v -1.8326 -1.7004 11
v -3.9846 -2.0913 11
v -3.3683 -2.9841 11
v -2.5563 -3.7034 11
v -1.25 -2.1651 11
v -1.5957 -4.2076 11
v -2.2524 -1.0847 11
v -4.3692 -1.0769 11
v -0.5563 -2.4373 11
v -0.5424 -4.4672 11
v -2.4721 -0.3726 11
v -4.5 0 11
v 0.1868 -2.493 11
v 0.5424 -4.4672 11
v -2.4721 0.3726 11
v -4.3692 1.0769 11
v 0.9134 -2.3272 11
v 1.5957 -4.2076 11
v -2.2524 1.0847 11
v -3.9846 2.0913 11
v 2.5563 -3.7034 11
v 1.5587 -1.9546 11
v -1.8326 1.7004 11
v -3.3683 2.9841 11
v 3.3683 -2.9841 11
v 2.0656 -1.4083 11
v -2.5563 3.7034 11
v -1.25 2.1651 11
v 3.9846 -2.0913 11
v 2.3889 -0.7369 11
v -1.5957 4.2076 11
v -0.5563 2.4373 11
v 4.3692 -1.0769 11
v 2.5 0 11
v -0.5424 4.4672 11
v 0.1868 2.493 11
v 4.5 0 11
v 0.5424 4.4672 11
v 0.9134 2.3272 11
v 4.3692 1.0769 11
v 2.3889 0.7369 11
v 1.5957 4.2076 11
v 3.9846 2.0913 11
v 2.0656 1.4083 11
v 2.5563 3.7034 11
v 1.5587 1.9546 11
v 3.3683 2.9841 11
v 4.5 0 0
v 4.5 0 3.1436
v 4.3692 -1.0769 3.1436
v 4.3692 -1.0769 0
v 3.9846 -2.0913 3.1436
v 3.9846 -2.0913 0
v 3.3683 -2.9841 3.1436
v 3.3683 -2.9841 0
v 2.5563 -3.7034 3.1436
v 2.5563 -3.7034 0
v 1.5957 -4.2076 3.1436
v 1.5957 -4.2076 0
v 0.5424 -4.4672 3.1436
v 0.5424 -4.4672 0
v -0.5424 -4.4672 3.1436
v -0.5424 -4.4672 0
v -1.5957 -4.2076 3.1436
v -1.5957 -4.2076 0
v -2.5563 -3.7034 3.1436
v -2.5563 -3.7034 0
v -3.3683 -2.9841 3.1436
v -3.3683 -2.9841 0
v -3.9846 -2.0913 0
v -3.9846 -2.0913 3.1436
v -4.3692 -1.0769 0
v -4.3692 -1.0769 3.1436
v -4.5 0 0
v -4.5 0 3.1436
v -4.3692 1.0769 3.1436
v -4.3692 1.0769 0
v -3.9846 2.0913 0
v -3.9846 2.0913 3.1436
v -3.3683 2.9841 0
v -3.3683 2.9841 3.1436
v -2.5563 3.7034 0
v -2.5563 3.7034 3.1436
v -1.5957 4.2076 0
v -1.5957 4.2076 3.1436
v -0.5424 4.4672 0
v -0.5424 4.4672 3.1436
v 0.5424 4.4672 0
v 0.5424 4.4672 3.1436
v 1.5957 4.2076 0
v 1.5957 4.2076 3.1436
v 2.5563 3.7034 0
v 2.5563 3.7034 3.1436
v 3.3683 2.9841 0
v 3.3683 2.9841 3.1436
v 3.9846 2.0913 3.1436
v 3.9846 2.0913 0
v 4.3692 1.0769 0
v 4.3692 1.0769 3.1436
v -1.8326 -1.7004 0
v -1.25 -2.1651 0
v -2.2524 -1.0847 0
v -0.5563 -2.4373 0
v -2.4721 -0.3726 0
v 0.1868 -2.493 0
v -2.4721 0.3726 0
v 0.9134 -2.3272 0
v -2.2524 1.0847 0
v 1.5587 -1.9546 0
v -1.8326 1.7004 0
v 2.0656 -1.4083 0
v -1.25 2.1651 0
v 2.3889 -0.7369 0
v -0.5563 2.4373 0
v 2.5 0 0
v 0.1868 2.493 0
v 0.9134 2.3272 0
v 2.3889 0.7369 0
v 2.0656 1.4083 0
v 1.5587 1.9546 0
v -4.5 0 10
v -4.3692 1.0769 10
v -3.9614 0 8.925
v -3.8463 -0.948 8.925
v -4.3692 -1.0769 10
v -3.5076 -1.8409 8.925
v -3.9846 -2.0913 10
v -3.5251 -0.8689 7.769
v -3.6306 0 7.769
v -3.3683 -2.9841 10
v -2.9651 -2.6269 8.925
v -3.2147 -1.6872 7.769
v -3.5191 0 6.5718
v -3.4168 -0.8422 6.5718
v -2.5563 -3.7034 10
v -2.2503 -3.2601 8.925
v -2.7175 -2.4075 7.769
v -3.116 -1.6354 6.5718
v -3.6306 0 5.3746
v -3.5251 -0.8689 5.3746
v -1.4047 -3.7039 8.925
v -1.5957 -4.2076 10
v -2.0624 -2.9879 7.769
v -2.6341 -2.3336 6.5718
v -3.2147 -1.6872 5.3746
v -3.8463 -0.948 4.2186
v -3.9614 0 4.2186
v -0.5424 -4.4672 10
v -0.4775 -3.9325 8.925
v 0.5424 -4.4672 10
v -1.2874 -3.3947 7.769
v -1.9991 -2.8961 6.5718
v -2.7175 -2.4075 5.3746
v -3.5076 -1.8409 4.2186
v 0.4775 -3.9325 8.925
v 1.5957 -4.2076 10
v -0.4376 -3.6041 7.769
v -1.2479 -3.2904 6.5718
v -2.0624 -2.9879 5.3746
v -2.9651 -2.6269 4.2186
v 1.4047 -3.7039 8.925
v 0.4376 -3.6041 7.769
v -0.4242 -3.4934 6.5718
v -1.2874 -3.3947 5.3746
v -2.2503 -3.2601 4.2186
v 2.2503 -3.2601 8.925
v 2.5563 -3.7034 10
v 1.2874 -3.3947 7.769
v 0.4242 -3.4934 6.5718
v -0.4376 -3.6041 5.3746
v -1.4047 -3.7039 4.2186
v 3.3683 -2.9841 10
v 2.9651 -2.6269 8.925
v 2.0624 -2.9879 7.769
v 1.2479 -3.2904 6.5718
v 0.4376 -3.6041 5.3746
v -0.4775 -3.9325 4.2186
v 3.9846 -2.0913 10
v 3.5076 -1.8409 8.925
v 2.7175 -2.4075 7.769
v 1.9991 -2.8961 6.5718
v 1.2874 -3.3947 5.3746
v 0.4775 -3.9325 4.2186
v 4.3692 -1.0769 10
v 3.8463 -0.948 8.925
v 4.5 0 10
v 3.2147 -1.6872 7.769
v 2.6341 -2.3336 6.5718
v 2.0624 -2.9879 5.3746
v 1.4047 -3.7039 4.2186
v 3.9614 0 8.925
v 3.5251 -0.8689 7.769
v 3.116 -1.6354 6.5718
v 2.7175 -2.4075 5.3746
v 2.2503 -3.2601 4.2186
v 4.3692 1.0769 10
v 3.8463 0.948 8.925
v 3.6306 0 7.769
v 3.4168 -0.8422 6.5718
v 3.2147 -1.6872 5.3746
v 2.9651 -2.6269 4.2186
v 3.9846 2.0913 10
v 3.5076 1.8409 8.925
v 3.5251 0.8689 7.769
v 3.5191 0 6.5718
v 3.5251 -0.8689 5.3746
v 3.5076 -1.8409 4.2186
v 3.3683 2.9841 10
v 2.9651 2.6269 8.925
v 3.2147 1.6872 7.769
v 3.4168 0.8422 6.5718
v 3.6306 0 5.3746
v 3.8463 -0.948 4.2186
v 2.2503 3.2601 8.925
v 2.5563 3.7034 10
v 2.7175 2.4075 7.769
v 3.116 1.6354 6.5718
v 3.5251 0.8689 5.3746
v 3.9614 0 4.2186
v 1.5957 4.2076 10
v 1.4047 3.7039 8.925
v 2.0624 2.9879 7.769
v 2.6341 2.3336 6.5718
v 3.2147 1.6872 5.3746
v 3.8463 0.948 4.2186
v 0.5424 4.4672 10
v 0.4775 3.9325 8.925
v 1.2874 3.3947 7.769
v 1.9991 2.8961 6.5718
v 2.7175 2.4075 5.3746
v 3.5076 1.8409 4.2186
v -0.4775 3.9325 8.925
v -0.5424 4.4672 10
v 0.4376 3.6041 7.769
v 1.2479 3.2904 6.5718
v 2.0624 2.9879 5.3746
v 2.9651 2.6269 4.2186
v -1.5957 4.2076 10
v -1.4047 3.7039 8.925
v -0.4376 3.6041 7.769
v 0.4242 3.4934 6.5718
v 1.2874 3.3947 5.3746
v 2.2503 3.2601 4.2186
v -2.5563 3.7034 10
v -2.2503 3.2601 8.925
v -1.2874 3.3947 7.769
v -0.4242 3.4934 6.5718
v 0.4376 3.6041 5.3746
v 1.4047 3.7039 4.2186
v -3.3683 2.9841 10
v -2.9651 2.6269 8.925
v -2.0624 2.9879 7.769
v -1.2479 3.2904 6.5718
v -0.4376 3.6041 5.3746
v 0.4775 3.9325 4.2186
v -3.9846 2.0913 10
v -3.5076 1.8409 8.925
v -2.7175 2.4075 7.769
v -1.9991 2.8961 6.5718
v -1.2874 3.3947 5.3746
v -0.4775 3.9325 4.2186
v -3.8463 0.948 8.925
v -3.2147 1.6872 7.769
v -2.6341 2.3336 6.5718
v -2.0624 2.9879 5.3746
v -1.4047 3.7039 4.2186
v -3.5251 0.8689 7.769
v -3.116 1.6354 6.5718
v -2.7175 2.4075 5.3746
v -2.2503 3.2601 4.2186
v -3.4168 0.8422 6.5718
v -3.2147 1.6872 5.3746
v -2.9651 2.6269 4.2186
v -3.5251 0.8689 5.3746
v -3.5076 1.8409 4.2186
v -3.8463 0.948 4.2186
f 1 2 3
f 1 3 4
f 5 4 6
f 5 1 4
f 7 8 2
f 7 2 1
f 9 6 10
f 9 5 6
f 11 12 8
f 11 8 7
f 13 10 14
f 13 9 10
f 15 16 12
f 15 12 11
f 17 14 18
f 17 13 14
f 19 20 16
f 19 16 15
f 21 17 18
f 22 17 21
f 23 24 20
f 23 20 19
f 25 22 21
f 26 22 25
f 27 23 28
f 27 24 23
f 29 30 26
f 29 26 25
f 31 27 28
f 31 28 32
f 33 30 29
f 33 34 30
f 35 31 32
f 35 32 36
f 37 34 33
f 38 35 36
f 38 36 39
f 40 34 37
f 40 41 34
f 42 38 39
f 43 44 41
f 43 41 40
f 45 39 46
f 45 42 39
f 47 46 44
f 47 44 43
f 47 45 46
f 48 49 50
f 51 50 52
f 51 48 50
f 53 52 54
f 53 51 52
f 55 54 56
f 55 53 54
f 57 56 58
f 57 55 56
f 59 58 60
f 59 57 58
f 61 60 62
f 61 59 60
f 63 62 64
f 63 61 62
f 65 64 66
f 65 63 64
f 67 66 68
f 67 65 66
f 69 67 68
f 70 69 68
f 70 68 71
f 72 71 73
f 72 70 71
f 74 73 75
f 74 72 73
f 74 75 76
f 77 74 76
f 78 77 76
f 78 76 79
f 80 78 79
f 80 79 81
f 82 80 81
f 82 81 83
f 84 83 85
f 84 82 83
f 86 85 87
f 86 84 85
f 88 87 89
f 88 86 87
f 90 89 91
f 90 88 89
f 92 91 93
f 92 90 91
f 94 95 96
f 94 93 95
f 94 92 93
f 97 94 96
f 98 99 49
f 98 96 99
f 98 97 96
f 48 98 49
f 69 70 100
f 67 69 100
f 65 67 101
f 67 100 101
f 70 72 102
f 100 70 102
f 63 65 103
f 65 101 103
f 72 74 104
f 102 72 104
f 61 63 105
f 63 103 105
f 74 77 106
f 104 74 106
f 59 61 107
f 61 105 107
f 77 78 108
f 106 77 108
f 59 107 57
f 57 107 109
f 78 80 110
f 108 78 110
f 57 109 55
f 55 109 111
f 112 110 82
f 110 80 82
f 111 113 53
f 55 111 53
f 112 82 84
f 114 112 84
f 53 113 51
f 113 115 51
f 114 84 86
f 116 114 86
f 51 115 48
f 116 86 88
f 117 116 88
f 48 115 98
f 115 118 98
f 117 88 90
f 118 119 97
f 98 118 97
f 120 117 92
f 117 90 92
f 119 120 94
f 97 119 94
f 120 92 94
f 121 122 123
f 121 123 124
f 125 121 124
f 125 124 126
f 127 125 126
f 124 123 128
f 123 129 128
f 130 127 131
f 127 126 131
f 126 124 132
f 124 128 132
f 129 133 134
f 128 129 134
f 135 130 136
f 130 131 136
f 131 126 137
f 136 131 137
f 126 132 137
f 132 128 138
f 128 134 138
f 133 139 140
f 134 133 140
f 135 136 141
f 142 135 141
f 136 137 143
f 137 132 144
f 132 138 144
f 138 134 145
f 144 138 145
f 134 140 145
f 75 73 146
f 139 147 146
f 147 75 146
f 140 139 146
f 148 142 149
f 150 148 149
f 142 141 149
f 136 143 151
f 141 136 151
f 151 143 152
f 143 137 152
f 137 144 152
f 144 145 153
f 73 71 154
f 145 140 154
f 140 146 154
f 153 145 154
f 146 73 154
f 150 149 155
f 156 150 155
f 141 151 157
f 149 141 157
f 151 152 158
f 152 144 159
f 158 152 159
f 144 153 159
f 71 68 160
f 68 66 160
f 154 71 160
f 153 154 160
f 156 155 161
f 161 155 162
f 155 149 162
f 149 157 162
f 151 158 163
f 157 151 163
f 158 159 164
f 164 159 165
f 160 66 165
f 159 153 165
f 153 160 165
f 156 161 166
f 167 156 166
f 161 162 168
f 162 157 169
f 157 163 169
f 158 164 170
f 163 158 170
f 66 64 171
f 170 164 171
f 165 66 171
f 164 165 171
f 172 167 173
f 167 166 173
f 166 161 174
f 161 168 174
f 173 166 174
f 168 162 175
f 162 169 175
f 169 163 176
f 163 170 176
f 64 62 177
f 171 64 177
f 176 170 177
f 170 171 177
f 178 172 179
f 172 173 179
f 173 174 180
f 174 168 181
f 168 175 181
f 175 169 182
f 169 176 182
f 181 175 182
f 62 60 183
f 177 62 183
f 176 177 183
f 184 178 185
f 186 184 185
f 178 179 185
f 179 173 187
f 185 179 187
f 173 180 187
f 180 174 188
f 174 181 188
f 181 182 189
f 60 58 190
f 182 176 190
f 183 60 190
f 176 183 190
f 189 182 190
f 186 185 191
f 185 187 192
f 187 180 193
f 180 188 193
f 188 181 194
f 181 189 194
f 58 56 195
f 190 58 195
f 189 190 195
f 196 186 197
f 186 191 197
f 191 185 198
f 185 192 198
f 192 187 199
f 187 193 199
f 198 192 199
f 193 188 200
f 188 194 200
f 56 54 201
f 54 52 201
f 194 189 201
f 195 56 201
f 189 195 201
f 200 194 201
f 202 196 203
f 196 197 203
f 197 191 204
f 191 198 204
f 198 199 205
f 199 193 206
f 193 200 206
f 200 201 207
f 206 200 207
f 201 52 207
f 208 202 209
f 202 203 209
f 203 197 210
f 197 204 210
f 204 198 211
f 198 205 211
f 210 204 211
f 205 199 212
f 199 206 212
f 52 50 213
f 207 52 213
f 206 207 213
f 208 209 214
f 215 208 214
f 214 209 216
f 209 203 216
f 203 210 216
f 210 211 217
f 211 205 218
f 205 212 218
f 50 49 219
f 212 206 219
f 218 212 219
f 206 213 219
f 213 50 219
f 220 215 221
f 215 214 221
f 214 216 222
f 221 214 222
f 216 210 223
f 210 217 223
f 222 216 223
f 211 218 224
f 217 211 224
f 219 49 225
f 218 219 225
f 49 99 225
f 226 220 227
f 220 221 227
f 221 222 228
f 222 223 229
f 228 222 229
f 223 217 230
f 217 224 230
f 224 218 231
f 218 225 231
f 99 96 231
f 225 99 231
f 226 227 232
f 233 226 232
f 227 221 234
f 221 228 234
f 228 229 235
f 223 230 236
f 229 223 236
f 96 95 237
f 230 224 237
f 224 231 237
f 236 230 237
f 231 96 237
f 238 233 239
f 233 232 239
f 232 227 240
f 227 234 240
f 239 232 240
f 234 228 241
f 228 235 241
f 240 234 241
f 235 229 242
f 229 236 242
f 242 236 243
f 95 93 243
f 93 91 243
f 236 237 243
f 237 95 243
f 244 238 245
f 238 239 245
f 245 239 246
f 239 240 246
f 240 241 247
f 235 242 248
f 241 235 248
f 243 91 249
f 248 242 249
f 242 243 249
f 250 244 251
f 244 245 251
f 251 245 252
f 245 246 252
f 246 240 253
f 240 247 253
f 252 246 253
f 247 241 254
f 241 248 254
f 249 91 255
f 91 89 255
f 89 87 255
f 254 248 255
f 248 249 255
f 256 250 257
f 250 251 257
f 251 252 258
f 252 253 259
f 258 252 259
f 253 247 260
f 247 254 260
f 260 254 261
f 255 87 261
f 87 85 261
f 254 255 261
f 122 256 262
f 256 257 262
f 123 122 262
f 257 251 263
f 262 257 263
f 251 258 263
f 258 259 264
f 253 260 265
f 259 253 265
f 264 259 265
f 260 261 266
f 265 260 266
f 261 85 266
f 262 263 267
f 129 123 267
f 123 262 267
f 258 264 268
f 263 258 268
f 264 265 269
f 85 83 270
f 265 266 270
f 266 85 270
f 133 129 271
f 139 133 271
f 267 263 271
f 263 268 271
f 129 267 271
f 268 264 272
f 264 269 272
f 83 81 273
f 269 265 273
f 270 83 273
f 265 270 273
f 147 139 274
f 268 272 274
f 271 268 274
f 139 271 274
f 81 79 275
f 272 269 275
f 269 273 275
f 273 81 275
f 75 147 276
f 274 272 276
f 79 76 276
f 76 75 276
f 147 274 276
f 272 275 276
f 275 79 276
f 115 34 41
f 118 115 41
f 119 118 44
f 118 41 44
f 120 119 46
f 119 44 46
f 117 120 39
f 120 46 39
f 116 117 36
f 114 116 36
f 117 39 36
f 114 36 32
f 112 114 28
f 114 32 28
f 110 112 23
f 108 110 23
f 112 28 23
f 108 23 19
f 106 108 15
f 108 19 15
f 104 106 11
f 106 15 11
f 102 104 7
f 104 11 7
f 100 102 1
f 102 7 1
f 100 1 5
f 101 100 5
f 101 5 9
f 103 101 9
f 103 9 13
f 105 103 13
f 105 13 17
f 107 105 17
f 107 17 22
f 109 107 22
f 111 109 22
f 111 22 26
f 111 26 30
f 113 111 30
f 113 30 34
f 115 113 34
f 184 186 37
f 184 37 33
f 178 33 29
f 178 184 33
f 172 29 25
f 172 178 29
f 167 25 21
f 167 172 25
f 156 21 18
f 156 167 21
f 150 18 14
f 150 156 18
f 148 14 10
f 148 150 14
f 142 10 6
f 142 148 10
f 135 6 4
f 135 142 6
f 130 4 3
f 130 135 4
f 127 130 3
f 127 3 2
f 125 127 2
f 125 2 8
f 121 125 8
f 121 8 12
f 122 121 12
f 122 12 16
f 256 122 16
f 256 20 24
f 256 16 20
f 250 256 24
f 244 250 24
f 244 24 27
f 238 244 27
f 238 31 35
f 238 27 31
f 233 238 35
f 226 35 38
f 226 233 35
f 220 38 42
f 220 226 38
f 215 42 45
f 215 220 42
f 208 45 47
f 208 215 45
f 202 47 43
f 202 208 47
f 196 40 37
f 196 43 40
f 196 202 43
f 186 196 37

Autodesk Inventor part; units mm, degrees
ref_plane "YZ Plane" through (0, 0, 0) normal (1, 0, 0) x (0, 1, 0)
ref_plane "XZ Plane" through (0, 0, 0) normal (0, 1, 0) x (-1, 0, 0)
ref_plane "XY Plane" through (0, 0, 0) normal (0, 0, 1) x (1, 0, 0)
sketch "Skizze1" plane through (0, 0, 0) normal (0, 0, 1) x (1, 0, 0)
  circle A0 centre (0, 0) radius 4.5
  dimension "d0" = 9
extrude "Extrusion1" add sketch "Skizze1" along normal blind 11
sketch "Skizze2" plane through (0, 0, 11) normal (0, 0, 1) x (1, 0, 0)
  circle A0 centre (0, 0) radius 2.5
  dimension "d3" = 5
extrude "Extrusion2" cut sketch "Skizze2" against normal blind 11
sketch "Skizze5" plane through (0, 0, 0) normal (0, 1, 0) x (-1, 0, 0)
  line L0 (4.5, 11) -> (-4.5, 11) projected
  line L1 (-4.5, 0) -> (4.5, 0) projected
  line L2 (4.5, 0) -> (4.5, 11) projected
  line L3 (-4.5, 0) -> (-4.5, 11) projected
  arc A0 (4.5, 10) -> (4.5, 3.1436) centre (10, 6.5718) ccw
  line L4 (4.5, 11) -> (-4.5, 11) projected
  line L5 (3.5, 11) -> (3.5, 0)
  line L6 (-4.5, 0) -> (4.5, 0) projected
  line L7 (4.5, 3.1436) -> (4.5, 10)
  line L8 (0, -2.2) -> (0, 13.2) projected
  point P0 (0, 0)
  dimension "d12" = 1
  dimension "d13" = 5.5
revolve "Umdrehung1" cut sketch "Skizze5" angle 360 about axis through (0, 0, -10) along (0, 0, 1) contours L2 A0
properties part number "MK8_Drive_gear" material "Stahl, Kohlenstoff"
